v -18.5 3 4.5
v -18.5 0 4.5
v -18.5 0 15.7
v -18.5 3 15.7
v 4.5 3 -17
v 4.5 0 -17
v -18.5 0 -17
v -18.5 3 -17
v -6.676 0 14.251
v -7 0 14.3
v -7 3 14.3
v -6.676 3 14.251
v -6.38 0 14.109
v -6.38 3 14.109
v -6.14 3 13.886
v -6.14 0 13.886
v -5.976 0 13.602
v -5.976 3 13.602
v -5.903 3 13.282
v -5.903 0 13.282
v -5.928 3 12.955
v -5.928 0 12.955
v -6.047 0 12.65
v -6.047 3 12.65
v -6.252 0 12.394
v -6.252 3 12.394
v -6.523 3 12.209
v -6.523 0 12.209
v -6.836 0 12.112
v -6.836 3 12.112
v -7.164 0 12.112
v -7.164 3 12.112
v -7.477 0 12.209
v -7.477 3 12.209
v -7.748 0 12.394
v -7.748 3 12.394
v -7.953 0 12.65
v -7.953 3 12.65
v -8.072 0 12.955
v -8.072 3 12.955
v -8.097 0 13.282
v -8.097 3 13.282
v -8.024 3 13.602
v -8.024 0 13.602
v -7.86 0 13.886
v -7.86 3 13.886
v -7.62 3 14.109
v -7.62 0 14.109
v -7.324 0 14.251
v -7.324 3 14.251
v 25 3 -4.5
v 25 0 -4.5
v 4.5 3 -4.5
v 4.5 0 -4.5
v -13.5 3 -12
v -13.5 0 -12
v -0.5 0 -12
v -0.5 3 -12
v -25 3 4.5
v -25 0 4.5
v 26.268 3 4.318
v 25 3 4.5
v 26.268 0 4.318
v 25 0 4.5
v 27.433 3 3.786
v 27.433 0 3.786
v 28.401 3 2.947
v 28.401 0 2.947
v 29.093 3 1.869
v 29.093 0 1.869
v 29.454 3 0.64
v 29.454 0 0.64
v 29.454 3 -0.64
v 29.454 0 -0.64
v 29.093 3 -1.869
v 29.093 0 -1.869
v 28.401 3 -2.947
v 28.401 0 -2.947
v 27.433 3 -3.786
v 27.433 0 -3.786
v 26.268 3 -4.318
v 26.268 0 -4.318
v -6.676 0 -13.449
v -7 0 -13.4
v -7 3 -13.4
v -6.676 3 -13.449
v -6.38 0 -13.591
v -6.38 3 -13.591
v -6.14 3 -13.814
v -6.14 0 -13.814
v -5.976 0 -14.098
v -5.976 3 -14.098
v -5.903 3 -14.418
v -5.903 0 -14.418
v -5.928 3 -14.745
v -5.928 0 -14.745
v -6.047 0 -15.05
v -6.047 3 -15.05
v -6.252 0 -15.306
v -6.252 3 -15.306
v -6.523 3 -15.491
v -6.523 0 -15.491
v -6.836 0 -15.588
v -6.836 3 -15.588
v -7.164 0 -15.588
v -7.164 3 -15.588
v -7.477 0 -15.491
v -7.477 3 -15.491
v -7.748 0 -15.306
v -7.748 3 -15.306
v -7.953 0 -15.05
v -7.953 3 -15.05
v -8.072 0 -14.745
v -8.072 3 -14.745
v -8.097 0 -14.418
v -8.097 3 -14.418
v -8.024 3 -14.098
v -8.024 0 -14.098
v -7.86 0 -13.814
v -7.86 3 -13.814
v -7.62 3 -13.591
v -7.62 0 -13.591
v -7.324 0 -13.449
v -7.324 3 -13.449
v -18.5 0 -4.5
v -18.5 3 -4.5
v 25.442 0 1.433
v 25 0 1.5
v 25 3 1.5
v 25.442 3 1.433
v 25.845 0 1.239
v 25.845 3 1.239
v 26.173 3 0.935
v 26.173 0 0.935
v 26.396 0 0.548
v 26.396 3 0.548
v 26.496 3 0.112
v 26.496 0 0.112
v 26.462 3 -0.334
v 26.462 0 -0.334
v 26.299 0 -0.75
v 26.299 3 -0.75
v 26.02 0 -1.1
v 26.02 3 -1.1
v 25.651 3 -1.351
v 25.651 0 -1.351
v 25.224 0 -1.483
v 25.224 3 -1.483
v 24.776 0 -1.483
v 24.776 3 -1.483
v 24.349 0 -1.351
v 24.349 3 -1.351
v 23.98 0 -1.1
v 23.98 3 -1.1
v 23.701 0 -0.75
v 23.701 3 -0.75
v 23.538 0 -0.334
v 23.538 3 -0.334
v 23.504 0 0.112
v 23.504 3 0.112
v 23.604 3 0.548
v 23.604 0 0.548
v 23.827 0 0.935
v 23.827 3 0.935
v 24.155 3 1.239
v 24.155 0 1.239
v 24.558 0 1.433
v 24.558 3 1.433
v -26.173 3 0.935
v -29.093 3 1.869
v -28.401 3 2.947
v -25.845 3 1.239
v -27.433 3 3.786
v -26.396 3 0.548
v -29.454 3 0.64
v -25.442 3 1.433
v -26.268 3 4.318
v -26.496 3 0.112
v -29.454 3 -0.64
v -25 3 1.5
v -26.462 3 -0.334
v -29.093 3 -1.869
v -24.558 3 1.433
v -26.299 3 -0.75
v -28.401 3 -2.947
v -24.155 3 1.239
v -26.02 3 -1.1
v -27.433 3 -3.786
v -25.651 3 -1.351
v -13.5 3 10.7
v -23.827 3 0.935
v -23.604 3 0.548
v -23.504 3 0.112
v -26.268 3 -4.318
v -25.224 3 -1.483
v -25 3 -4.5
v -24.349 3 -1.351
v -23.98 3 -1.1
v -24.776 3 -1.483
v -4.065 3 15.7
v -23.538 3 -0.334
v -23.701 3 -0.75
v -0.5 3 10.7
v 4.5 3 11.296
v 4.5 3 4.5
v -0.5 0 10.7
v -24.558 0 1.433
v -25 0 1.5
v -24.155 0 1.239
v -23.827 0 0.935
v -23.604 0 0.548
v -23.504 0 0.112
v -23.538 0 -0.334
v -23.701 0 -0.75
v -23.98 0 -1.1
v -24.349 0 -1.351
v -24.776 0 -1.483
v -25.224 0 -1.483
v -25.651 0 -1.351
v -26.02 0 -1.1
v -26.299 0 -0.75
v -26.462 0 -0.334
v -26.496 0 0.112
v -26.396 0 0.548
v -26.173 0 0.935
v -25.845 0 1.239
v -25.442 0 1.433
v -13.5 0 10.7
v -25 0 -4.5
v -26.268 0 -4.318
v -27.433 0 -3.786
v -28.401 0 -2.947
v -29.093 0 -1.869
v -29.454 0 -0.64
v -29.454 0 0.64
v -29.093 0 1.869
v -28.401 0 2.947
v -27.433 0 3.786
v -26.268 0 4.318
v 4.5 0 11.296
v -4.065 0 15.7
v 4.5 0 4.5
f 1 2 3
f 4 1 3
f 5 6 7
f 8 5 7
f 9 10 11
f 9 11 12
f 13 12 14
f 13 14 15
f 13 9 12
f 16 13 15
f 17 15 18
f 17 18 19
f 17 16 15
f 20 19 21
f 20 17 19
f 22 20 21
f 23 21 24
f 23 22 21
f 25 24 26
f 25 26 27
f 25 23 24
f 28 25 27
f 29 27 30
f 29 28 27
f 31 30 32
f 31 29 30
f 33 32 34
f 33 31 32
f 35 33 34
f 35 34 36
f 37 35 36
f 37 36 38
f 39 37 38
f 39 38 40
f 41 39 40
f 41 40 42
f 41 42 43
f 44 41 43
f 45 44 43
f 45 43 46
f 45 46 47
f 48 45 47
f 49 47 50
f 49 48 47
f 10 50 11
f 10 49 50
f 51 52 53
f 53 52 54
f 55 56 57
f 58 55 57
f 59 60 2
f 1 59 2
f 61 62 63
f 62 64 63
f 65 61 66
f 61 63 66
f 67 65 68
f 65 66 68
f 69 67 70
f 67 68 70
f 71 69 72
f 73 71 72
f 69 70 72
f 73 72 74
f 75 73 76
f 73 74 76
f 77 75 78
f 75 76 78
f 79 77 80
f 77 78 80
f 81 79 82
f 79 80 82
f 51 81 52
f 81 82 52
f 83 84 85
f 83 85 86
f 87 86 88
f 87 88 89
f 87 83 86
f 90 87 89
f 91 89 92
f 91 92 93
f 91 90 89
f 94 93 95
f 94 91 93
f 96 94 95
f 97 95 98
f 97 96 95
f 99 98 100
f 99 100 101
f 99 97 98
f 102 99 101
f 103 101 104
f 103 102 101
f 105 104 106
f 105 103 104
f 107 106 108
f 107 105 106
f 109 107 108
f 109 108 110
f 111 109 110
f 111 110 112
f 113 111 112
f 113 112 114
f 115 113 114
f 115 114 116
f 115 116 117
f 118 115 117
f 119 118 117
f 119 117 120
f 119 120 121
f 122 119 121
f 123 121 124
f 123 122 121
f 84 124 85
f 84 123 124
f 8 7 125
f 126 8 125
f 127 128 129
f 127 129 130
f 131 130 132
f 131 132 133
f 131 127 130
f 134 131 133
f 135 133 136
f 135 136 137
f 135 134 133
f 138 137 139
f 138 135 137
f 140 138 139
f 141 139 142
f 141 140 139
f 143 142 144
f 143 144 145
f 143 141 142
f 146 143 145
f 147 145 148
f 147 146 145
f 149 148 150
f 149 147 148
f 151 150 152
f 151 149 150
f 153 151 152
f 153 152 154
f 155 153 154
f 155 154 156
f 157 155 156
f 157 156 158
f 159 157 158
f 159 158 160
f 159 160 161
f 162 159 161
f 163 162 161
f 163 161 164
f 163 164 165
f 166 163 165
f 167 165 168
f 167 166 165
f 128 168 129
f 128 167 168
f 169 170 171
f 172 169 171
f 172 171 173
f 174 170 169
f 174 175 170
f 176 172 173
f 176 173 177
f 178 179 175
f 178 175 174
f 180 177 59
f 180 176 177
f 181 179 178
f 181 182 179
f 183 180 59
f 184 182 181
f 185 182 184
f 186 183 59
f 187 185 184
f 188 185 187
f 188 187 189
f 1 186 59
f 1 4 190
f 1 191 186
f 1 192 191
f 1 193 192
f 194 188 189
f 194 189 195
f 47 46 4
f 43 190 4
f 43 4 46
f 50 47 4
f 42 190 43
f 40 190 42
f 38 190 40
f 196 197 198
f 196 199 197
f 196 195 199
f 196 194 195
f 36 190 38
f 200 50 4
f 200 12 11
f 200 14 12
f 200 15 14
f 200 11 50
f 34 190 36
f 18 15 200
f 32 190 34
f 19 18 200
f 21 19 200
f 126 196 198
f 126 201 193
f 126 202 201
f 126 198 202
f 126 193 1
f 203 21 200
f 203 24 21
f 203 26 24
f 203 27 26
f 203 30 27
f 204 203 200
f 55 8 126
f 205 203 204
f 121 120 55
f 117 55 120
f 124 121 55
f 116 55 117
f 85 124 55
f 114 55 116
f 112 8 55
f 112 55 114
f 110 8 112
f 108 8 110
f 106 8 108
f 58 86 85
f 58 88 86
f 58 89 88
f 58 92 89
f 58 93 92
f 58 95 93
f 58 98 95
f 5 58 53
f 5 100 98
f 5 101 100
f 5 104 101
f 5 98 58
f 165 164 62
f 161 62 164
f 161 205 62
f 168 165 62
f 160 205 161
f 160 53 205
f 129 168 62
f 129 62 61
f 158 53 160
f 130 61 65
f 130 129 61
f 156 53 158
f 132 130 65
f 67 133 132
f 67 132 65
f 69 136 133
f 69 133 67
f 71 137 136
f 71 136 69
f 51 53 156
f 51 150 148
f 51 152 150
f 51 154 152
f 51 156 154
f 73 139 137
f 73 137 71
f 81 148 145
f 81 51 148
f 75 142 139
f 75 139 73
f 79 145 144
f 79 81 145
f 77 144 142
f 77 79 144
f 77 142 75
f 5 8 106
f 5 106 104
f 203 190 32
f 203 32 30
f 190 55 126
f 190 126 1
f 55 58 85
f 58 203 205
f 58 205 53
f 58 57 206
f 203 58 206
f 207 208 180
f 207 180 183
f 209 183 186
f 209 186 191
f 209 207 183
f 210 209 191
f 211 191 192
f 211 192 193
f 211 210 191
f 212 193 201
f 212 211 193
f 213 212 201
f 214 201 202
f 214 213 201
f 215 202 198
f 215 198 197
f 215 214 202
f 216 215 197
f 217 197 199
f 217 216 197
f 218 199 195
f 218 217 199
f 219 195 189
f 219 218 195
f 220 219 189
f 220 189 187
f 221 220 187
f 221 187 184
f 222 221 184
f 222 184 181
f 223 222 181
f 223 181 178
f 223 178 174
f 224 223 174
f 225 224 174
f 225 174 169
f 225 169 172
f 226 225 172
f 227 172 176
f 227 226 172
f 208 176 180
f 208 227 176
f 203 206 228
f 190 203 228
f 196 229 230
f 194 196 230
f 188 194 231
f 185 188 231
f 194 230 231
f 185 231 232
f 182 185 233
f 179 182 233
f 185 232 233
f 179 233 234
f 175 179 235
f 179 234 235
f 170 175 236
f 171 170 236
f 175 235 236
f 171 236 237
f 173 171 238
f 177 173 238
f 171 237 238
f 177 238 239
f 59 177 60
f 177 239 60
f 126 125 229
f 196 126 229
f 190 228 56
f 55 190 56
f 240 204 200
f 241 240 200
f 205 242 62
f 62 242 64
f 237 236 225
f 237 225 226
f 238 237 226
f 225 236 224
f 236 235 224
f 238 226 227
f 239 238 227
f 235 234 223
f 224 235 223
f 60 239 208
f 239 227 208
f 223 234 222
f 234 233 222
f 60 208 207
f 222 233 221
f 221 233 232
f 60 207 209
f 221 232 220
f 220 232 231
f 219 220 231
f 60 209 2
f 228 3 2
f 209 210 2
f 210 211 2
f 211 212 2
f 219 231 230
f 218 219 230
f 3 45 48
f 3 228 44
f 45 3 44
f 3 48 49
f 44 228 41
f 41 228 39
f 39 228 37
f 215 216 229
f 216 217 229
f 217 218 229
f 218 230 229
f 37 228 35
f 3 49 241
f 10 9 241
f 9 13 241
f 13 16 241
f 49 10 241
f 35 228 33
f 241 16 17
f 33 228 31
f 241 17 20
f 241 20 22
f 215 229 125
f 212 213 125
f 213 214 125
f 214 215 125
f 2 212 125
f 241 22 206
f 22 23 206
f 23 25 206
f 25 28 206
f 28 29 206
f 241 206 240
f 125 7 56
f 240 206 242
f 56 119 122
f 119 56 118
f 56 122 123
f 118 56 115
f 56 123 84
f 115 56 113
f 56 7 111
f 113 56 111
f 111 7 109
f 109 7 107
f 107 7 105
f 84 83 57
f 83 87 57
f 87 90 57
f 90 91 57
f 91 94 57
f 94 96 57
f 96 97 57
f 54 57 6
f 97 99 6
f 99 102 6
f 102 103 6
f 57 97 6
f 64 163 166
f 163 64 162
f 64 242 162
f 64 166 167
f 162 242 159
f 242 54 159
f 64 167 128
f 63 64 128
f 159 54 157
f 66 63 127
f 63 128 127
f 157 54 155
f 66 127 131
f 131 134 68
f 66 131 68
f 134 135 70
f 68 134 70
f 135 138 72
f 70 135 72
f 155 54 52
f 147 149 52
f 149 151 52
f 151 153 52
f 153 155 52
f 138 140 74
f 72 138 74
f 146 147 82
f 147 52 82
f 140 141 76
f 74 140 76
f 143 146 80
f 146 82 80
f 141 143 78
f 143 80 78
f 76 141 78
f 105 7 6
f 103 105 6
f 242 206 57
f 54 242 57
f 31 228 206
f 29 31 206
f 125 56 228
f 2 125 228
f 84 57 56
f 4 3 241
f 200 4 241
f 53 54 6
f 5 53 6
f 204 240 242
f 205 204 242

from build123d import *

# Parameters (mm, degrees)
SKETCH_1_R          = 4.5
SKETCH_1_R_2        = 1.5
SKETCH_1_W          = 5
SKETCH_1_H          = 9
SKETCH_1_R_3        = 2.5
SKETCH_1_R_4        = 1.1
EXTRUDE_1_DEPTH     = 3
CUT_EXTRUDE_1_DEPTH = 35.179672321


with BuildPart() as part:
    # 草图1 → 凸台-拉伸1 (new body)
    # profile 1 of 12: a face of its own
    with BuildSketch(Plane(origin=(0, 0, 0), x_dir=(1, 0, 0), z_dir=(0, 1, 0))):
        with Locations((-25, 0)):
            Circle(SKETCH_1_R)
        with Locations(Location((-25, 0, 0), (0, 0, 270))):
            Circle(SKETCH_1_R_2, mode=Mode.SUBTRACT)
    # profile 2 of 12: a face of its own
    with BuildSketch(Plane(origin=(0, 0, 0), x_dir=(1, 0, 0), z_dir=(0, 1, 0))):
        with BuildLine():
            Line((-18.5, 4.5), (-25, 4.5))
            ThreePointArc((-25, 4.5), (-21.818019485, 3.181980515), (-20.5, 0))
            ThreePointArc((-20.5, 0), (-21.818019485, -3.181980515), (-25, -4.5))
            Line((-25, -4.5), (-18.5, -4.5))
            Line((-18.5, -4.5), (-18.5, 4.5))
        make_face()
    # profile 3 of 12: a face of its own
    with BuildSketch(Plane(origin=(0, 0, 0), x_dir=(1, 0, 0), z_dir=(0, 1, 0))):
        with Locations((-16, 0)):
            Rectangle(SKETCH_1_W, SKETCH_1_H)
    # profile 4 of 12: a face of its own
    with BuildSketch(Plane(origin=(0, 0, 0), x_dir=(1, 0, 0), z_dir=(0, 1, 0))):
        with BuildLine():
            Line((-13.5, -4.5), (-18.5, -4.5))
            Line((-18.5, -4.5), (-18.5, -15.7))
            Line((-18.5, -15.7), (-7.000000018, -15.7))
            ThreePointArc((-7.000000018, -15.7), (-9.5, -13.199999991), (-7, -10.7))
            Line((-7, -10.7), (-13.5, -10.7))
            Line((-13.5, -10.7), (-13.5, -4.5))
        make_face()
    # profile 5 of 12: a face of its own
    with BuildSketch(Plane(origin=(0, 0, 0), x_dir=(1, 0, 0), z_dir=(0, 1, 0))):
        with BuildLine():
            Line((4.5, -4.5), (-0.5, -4.5))
            Line((-0.5, -4.5), (-0.5, -10.7))
            Line((-0.5, -10.7), (-7, -10.7))
            ThreePointArc((-7, -10.7), (-5.232233047, -11.432233047), (-4.5, -13.2))
            ThreePointArc((-4.5, -13.2), (-5.232233054, -14.967766959), (-7.000000018, -15.7))
            Line((-7.000000018, -15.7), (4.5, -15.7))
            Line((4.5, -15.7), (4.5, -4.5))
        make_face()
    # profile 6 of 12: a face of its own
    with BuildSketch(Plane(origin=(0, 0, 0), x_dir=(1, 0, 0), z_dir=(0, 1, 0))):
        Polygon((4.5, 4.5), (-0.5, 4.5), (-0.5, -4.5), (4.5, -4.5), (4.5, 0), align=None)
    # profile 7 of 12: a face of its own
    with BuildSketch(Plane(origin=(0, 0, 0), x_dir=(1, 0, 0), z_dir=(0, 1, 0))):
        with BuildLine():
            Line((-0.5, 12), (-0.5, 4.5))
            Line((-0.5, 4.5), (4.5, 4.5))
            Line((4.5, 4.5), (4.5, 17))
            Line((4.5, 17), (-7.000000057, 17))
            ThreePointArc((-7.000000057, 17), (-5.232233067, 16.267766973), (-4.5, 14.5))
            ThreePointArc((-4.5, 14.5), (-5.232233047, 12.732233047), (-7, 12))
            Line((-7, 12), (-0.5, 12))
        make_face()
    # profile 8 of 12: a face of its own
    with BuildSketch(Plane(origin=(0, 0, 0), x_dir=(1, 0, 0), z_dir=(0, 1, 0))):
        with BuildLine():
            Line((-18.5, 17), (-18.5, 4.5))
            Line((-18.5, 4.5), (-13.5, 4.5))
            Line((-13.5, 4.5), (-13.5, 12))
            Line((-13.5, 12), (-7, 12))
            ThreePointArc((-7, 12), (-9.5, 14.499999972), (-7.000000057, 17))
            Line((-7.000000057, 17), (-18.5, 17))
        make_face()
    # profile 9 of 12: a face of its own
    with BuildSketch(Plane(origin=(0, 0, 0), x_dir=(1, 0, 0), z_dir=(0, 1, 0))):
        with BuildLine():
            Line((25, 4.5), (4.5, 4.5))
            Line((4.5, 4.5), (4.5, 0))
            Line((4.5, 0), (4.5, -4.5))
            Line((4.5, -4.5), (25, -4.5))
            ThreePointArc((25, -4.5), (20.5, 0), (25, 4.5))
        make_face()
    # profile 10 of 12: a face of its own
    with BuildSketch(Plane(origin=(0, 0, 0), x_dir=(1, 0, 0), z_dir=(0, 1, 0))):
        with Locations((25, 0)):
            Circle(SKETCH_1_R)
        with Locations(Location((25, 0, 0), (0, 0, 270))):
            Circle(SKETCH_1_R_2, mode=Mode.SUBTRACT)
    # profile 11 of 12: a face of its own
    with BuildSketch(Plane(origin=(0, 0, 0), x_dir=(1, 0, 0), z_dir=(0, 1, 0))):
        with Locations((-7, 14.5)):
            Circle(SKETCH_1_R_3)
        with Locations(Location((-7, 14.5, 0), (0, 0, 270))):
            Circle(SKETCH_1_R_4, mode=Mode.SUBTRACT)
    # profile 12 of 12: a face of its own
    with BuildSketch(Plane(origin=(0, 0, 0), x_dir=(1, 0, 0), z_dir=(0, 1, 0))):
        with Locations((-7, -13.2)):
            Circle(SKETCH_1_R_3)
        with Locations(Location((-7, -13.2, 0), (0, 0, 270))):
            Circle(SKETCH_1_R_4, mode=Mode.SUBTRACT)
    extrude(amount=EXTRUDE_1_DEPTH)

    # 草图2 → 切除-拉伸1 (cut, through all)
    with BuildSketch(Plane(origin=(0, 3, 0), x_dir=(1, 0, 0), z_dir=(0, 1, 0))):
        Polygon((4.5, -15.7), (4.5, -11.296015474), (-4.064964363, -15.7), align=None)
    extrude(amount=-CUT_EXTRUDE_1_DEPTH, mode=Mode.SUBTRACT)


solid = part.part
